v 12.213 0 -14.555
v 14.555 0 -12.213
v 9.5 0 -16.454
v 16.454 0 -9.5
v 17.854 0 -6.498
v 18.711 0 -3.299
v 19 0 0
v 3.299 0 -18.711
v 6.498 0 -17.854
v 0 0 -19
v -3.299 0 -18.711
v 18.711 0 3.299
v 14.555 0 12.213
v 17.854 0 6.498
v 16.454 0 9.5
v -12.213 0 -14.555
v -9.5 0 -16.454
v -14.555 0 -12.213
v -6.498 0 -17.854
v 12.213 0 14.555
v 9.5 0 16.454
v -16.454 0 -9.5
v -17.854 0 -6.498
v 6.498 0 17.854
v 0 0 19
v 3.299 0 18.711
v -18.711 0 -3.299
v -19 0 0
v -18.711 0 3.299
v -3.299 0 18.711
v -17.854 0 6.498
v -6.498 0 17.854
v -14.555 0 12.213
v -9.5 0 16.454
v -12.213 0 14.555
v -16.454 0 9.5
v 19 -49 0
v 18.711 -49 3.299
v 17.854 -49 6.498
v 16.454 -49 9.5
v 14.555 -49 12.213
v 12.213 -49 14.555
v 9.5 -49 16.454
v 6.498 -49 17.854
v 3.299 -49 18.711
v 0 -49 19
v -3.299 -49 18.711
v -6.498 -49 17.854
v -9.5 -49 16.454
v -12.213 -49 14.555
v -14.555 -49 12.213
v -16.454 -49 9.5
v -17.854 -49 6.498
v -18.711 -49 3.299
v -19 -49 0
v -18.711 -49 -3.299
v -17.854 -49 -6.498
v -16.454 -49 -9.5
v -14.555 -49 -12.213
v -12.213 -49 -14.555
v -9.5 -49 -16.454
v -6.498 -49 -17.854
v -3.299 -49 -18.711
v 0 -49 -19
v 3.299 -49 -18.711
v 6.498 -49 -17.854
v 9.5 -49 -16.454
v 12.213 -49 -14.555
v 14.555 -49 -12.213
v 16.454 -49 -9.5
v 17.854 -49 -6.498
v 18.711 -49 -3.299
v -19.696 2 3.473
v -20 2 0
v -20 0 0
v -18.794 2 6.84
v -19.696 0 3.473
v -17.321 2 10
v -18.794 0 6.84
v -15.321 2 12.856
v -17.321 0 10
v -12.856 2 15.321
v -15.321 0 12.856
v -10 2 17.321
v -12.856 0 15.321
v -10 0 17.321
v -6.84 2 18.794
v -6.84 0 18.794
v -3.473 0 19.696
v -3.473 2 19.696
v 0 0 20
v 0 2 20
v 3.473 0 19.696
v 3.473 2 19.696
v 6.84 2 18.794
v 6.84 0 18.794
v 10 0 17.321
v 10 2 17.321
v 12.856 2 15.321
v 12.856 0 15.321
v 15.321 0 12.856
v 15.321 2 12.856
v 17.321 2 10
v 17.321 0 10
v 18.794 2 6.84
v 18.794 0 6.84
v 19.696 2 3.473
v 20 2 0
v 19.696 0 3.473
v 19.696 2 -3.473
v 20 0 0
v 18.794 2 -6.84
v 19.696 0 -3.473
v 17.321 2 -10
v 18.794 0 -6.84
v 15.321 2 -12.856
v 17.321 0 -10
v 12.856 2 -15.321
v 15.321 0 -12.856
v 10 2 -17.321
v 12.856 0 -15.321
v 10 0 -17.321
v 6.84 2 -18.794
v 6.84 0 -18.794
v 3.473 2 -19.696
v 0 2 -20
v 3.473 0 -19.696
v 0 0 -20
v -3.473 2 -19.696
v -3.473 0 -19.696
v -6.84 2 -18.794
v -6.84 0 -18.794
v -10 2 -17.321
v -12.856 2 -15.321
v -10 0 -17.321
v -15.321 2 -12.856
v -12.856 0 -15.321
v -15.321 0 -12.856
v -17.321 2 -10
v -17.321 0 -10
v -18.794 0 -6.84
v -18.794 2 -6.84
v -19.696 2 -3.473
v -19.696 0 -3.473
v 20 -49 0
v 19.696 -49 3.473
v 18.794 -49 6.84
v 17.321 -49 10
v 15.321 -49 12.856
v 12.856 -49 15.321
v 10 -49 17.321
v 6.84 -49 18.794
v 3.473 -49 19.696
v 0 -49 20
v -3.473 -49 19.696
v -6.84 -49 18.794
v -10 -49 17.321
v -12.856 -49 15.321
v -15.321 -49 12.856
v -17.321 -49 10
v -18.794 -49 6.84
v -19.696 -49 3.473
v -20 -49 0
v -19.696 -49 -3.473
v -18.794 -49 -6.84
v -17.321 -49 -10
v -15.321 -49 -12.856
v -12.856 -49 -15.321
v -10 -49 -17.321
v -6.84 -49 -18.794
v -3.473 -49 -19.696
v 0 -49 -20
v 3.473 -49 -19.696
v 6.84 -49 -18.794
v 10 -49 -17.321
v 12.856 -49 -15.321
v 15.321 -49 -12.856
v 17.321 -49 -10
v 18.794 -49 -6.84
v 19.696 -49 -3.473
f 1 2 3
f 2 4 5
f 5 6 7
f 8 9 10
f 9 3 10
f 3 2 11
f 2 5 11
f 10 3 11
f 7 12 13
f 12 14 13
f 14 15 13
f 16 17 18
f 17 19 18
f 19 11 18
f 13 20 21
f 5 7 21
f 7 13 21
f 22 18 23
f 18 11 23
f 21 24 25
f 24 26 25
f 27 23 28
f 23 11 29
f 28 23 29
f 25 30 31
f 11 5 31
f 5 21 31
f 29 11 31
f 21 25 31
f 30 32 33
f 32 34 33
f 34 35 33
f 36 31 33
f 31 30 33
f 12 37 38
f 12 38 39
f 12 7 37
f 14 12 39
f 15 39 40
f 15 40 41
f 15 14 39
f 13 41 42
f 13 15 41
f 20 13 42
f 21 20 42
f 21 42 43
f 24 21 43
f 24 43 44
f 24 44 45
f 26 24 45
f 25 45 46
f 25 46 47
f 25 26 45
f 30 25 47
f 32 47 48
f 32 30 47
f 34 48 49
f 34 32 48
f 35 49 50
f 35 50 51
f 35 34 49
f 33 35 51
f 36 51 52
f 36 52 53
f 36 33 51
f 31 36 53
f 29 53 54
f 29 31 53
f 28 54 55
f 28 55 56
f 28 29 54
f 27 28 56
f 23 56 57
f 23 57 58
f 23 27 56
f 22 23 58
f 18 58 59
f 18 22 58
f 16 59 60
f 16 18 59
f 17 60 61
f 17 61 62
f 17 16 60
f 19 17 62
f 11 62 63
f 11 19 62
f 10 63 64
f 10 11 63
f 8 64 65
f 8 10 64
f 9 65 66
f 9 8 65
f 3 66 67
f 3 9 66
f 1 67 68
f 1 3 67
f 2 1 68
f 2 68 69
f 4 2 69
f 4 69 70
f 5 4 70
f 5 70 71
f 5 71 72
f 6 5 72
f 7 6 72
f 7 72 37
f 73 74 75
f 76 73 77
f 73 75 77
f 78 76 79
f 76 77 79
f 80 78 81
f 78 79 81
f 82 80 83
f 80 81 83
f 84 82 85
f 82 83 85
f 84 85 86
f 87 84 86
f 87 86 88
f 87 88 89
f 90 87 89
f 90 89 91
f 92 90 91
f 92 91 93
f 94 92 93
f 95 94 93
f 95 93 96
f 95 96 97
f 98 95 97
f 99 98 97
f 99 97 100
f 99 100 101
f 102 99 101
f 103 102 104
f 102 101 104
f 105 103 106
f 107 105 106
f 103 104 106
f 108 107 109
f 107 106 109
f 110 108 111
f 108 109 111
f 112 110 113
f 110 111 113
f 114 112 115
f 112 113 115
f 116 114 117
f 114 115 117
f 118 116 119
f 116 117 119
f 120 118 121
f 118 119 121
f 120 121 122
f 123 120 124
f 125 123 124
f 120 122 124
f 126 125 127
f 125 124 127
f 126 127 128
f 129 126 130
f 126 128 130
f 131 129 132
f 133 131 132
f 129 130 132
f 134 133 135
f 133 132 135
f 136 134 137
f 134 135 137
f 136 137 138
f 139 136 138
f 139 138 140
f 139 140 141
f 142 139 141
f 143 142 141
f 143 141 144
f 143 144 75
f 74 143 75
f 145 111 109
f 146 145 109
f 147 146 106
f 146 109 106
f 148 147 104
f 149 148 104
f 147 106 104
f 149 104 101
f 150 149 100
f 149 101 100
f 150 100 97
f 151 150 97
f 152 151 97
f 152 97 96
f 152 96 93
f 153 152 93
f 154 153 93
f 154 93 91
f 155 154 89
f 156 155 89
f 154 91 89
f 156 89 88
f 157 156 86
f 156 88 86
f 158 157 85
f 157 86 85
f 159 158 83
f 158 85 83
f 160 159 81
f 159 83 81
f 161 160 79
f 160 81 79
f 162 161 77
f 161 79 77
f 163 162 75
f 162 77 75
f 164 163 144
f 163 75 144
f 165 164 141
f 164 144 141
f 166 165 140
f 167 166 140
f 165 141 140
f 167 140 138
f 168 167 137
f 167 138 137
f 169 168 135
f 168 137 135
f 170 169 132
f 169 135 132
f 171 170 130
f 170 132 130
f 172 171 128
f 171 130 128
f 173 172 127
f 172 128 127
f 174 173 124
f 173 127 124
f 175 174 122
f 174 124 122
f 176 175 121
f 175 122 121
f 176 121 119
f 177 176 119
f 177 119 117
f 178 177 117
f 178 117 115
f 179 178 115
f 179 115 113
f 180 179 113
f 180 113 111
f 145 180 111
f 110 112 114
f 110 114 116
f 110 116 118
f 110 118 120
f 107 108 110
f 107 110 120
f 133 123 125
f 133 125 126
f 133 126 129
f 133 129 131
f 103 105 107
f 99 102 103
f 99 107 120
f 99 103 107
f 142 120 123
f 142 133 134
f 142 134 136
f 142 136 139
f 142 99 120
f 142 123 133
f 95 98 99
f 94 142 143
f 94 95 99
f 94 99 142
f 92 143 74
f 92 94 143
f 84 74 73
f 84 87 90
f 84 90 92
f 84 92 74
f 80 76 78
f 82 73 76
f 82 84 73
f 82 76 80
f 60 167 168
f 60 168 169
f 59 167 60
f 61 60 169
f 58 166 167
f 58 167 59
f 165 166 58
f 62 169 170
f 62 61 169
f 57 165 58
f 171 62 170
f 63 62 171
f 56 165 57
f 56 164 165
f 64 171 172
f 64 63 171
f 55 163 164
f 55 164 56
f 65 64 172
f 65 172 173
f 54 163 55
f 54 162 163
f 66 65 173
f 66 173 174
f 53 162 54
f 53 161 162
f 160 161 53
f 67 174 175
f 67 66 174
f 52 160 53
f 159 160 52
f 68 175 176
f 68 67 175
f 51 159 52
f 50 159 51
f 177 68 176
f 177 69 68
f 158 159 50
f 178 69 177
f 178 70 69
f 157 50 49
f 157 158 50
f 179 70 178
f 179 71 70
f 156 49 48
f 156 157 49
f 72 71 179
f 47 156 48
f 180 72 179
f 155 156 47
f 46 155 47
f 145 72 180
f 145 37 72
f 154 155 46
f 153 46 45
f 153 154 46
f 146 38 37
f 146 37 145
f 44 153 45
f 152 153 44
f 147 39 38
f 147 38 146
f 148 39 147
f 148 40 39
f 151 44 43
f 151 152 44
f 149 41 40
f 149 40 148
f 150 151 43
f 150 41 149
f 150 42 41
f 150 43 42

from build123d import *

# Parameters (mm, degrees)
F0_R     = 20
F0_R_2   = 19
F1_DEPTH = 22
F2_R     = 20
F2_R_2   = 19
F3_DEPTH = 27
F4_R     = 20
F4_R_2   = 19
F5_DEPTH = 2


with BuildPart() as f1:
    # F0 (on Front) → F1 (new body)
    with BuildSketch(Plane.XZ):
        Circle(F0_R)
        Circle(F0_R_2, mode=Mode.SUBTRACT)
    extrude(amount=F1_DEPTH)

    # F2 (on face) → F3 (join)
    with BuildSketch(Plane.XZ.offset(22)):
        Circle(F2_R)
        Circle(F2_R_2, mode=Mode.SUBTRACT)
    extrude(amount=F3_DEPTH)

    # F4 (on face) → F5 (join)
    with BuildSketch(Plane(origin=(0, 0, 0), x_dir=(-1, 0, 0), z_dir=(0, 1, 0))):
        Circle(F4_R)
        Circle(F4_R_2, mode=Mode.SUBTRACT)
        Circle(F4_R_2)
    extrude(amount=F5_DEPTH)


solid = f1.part
